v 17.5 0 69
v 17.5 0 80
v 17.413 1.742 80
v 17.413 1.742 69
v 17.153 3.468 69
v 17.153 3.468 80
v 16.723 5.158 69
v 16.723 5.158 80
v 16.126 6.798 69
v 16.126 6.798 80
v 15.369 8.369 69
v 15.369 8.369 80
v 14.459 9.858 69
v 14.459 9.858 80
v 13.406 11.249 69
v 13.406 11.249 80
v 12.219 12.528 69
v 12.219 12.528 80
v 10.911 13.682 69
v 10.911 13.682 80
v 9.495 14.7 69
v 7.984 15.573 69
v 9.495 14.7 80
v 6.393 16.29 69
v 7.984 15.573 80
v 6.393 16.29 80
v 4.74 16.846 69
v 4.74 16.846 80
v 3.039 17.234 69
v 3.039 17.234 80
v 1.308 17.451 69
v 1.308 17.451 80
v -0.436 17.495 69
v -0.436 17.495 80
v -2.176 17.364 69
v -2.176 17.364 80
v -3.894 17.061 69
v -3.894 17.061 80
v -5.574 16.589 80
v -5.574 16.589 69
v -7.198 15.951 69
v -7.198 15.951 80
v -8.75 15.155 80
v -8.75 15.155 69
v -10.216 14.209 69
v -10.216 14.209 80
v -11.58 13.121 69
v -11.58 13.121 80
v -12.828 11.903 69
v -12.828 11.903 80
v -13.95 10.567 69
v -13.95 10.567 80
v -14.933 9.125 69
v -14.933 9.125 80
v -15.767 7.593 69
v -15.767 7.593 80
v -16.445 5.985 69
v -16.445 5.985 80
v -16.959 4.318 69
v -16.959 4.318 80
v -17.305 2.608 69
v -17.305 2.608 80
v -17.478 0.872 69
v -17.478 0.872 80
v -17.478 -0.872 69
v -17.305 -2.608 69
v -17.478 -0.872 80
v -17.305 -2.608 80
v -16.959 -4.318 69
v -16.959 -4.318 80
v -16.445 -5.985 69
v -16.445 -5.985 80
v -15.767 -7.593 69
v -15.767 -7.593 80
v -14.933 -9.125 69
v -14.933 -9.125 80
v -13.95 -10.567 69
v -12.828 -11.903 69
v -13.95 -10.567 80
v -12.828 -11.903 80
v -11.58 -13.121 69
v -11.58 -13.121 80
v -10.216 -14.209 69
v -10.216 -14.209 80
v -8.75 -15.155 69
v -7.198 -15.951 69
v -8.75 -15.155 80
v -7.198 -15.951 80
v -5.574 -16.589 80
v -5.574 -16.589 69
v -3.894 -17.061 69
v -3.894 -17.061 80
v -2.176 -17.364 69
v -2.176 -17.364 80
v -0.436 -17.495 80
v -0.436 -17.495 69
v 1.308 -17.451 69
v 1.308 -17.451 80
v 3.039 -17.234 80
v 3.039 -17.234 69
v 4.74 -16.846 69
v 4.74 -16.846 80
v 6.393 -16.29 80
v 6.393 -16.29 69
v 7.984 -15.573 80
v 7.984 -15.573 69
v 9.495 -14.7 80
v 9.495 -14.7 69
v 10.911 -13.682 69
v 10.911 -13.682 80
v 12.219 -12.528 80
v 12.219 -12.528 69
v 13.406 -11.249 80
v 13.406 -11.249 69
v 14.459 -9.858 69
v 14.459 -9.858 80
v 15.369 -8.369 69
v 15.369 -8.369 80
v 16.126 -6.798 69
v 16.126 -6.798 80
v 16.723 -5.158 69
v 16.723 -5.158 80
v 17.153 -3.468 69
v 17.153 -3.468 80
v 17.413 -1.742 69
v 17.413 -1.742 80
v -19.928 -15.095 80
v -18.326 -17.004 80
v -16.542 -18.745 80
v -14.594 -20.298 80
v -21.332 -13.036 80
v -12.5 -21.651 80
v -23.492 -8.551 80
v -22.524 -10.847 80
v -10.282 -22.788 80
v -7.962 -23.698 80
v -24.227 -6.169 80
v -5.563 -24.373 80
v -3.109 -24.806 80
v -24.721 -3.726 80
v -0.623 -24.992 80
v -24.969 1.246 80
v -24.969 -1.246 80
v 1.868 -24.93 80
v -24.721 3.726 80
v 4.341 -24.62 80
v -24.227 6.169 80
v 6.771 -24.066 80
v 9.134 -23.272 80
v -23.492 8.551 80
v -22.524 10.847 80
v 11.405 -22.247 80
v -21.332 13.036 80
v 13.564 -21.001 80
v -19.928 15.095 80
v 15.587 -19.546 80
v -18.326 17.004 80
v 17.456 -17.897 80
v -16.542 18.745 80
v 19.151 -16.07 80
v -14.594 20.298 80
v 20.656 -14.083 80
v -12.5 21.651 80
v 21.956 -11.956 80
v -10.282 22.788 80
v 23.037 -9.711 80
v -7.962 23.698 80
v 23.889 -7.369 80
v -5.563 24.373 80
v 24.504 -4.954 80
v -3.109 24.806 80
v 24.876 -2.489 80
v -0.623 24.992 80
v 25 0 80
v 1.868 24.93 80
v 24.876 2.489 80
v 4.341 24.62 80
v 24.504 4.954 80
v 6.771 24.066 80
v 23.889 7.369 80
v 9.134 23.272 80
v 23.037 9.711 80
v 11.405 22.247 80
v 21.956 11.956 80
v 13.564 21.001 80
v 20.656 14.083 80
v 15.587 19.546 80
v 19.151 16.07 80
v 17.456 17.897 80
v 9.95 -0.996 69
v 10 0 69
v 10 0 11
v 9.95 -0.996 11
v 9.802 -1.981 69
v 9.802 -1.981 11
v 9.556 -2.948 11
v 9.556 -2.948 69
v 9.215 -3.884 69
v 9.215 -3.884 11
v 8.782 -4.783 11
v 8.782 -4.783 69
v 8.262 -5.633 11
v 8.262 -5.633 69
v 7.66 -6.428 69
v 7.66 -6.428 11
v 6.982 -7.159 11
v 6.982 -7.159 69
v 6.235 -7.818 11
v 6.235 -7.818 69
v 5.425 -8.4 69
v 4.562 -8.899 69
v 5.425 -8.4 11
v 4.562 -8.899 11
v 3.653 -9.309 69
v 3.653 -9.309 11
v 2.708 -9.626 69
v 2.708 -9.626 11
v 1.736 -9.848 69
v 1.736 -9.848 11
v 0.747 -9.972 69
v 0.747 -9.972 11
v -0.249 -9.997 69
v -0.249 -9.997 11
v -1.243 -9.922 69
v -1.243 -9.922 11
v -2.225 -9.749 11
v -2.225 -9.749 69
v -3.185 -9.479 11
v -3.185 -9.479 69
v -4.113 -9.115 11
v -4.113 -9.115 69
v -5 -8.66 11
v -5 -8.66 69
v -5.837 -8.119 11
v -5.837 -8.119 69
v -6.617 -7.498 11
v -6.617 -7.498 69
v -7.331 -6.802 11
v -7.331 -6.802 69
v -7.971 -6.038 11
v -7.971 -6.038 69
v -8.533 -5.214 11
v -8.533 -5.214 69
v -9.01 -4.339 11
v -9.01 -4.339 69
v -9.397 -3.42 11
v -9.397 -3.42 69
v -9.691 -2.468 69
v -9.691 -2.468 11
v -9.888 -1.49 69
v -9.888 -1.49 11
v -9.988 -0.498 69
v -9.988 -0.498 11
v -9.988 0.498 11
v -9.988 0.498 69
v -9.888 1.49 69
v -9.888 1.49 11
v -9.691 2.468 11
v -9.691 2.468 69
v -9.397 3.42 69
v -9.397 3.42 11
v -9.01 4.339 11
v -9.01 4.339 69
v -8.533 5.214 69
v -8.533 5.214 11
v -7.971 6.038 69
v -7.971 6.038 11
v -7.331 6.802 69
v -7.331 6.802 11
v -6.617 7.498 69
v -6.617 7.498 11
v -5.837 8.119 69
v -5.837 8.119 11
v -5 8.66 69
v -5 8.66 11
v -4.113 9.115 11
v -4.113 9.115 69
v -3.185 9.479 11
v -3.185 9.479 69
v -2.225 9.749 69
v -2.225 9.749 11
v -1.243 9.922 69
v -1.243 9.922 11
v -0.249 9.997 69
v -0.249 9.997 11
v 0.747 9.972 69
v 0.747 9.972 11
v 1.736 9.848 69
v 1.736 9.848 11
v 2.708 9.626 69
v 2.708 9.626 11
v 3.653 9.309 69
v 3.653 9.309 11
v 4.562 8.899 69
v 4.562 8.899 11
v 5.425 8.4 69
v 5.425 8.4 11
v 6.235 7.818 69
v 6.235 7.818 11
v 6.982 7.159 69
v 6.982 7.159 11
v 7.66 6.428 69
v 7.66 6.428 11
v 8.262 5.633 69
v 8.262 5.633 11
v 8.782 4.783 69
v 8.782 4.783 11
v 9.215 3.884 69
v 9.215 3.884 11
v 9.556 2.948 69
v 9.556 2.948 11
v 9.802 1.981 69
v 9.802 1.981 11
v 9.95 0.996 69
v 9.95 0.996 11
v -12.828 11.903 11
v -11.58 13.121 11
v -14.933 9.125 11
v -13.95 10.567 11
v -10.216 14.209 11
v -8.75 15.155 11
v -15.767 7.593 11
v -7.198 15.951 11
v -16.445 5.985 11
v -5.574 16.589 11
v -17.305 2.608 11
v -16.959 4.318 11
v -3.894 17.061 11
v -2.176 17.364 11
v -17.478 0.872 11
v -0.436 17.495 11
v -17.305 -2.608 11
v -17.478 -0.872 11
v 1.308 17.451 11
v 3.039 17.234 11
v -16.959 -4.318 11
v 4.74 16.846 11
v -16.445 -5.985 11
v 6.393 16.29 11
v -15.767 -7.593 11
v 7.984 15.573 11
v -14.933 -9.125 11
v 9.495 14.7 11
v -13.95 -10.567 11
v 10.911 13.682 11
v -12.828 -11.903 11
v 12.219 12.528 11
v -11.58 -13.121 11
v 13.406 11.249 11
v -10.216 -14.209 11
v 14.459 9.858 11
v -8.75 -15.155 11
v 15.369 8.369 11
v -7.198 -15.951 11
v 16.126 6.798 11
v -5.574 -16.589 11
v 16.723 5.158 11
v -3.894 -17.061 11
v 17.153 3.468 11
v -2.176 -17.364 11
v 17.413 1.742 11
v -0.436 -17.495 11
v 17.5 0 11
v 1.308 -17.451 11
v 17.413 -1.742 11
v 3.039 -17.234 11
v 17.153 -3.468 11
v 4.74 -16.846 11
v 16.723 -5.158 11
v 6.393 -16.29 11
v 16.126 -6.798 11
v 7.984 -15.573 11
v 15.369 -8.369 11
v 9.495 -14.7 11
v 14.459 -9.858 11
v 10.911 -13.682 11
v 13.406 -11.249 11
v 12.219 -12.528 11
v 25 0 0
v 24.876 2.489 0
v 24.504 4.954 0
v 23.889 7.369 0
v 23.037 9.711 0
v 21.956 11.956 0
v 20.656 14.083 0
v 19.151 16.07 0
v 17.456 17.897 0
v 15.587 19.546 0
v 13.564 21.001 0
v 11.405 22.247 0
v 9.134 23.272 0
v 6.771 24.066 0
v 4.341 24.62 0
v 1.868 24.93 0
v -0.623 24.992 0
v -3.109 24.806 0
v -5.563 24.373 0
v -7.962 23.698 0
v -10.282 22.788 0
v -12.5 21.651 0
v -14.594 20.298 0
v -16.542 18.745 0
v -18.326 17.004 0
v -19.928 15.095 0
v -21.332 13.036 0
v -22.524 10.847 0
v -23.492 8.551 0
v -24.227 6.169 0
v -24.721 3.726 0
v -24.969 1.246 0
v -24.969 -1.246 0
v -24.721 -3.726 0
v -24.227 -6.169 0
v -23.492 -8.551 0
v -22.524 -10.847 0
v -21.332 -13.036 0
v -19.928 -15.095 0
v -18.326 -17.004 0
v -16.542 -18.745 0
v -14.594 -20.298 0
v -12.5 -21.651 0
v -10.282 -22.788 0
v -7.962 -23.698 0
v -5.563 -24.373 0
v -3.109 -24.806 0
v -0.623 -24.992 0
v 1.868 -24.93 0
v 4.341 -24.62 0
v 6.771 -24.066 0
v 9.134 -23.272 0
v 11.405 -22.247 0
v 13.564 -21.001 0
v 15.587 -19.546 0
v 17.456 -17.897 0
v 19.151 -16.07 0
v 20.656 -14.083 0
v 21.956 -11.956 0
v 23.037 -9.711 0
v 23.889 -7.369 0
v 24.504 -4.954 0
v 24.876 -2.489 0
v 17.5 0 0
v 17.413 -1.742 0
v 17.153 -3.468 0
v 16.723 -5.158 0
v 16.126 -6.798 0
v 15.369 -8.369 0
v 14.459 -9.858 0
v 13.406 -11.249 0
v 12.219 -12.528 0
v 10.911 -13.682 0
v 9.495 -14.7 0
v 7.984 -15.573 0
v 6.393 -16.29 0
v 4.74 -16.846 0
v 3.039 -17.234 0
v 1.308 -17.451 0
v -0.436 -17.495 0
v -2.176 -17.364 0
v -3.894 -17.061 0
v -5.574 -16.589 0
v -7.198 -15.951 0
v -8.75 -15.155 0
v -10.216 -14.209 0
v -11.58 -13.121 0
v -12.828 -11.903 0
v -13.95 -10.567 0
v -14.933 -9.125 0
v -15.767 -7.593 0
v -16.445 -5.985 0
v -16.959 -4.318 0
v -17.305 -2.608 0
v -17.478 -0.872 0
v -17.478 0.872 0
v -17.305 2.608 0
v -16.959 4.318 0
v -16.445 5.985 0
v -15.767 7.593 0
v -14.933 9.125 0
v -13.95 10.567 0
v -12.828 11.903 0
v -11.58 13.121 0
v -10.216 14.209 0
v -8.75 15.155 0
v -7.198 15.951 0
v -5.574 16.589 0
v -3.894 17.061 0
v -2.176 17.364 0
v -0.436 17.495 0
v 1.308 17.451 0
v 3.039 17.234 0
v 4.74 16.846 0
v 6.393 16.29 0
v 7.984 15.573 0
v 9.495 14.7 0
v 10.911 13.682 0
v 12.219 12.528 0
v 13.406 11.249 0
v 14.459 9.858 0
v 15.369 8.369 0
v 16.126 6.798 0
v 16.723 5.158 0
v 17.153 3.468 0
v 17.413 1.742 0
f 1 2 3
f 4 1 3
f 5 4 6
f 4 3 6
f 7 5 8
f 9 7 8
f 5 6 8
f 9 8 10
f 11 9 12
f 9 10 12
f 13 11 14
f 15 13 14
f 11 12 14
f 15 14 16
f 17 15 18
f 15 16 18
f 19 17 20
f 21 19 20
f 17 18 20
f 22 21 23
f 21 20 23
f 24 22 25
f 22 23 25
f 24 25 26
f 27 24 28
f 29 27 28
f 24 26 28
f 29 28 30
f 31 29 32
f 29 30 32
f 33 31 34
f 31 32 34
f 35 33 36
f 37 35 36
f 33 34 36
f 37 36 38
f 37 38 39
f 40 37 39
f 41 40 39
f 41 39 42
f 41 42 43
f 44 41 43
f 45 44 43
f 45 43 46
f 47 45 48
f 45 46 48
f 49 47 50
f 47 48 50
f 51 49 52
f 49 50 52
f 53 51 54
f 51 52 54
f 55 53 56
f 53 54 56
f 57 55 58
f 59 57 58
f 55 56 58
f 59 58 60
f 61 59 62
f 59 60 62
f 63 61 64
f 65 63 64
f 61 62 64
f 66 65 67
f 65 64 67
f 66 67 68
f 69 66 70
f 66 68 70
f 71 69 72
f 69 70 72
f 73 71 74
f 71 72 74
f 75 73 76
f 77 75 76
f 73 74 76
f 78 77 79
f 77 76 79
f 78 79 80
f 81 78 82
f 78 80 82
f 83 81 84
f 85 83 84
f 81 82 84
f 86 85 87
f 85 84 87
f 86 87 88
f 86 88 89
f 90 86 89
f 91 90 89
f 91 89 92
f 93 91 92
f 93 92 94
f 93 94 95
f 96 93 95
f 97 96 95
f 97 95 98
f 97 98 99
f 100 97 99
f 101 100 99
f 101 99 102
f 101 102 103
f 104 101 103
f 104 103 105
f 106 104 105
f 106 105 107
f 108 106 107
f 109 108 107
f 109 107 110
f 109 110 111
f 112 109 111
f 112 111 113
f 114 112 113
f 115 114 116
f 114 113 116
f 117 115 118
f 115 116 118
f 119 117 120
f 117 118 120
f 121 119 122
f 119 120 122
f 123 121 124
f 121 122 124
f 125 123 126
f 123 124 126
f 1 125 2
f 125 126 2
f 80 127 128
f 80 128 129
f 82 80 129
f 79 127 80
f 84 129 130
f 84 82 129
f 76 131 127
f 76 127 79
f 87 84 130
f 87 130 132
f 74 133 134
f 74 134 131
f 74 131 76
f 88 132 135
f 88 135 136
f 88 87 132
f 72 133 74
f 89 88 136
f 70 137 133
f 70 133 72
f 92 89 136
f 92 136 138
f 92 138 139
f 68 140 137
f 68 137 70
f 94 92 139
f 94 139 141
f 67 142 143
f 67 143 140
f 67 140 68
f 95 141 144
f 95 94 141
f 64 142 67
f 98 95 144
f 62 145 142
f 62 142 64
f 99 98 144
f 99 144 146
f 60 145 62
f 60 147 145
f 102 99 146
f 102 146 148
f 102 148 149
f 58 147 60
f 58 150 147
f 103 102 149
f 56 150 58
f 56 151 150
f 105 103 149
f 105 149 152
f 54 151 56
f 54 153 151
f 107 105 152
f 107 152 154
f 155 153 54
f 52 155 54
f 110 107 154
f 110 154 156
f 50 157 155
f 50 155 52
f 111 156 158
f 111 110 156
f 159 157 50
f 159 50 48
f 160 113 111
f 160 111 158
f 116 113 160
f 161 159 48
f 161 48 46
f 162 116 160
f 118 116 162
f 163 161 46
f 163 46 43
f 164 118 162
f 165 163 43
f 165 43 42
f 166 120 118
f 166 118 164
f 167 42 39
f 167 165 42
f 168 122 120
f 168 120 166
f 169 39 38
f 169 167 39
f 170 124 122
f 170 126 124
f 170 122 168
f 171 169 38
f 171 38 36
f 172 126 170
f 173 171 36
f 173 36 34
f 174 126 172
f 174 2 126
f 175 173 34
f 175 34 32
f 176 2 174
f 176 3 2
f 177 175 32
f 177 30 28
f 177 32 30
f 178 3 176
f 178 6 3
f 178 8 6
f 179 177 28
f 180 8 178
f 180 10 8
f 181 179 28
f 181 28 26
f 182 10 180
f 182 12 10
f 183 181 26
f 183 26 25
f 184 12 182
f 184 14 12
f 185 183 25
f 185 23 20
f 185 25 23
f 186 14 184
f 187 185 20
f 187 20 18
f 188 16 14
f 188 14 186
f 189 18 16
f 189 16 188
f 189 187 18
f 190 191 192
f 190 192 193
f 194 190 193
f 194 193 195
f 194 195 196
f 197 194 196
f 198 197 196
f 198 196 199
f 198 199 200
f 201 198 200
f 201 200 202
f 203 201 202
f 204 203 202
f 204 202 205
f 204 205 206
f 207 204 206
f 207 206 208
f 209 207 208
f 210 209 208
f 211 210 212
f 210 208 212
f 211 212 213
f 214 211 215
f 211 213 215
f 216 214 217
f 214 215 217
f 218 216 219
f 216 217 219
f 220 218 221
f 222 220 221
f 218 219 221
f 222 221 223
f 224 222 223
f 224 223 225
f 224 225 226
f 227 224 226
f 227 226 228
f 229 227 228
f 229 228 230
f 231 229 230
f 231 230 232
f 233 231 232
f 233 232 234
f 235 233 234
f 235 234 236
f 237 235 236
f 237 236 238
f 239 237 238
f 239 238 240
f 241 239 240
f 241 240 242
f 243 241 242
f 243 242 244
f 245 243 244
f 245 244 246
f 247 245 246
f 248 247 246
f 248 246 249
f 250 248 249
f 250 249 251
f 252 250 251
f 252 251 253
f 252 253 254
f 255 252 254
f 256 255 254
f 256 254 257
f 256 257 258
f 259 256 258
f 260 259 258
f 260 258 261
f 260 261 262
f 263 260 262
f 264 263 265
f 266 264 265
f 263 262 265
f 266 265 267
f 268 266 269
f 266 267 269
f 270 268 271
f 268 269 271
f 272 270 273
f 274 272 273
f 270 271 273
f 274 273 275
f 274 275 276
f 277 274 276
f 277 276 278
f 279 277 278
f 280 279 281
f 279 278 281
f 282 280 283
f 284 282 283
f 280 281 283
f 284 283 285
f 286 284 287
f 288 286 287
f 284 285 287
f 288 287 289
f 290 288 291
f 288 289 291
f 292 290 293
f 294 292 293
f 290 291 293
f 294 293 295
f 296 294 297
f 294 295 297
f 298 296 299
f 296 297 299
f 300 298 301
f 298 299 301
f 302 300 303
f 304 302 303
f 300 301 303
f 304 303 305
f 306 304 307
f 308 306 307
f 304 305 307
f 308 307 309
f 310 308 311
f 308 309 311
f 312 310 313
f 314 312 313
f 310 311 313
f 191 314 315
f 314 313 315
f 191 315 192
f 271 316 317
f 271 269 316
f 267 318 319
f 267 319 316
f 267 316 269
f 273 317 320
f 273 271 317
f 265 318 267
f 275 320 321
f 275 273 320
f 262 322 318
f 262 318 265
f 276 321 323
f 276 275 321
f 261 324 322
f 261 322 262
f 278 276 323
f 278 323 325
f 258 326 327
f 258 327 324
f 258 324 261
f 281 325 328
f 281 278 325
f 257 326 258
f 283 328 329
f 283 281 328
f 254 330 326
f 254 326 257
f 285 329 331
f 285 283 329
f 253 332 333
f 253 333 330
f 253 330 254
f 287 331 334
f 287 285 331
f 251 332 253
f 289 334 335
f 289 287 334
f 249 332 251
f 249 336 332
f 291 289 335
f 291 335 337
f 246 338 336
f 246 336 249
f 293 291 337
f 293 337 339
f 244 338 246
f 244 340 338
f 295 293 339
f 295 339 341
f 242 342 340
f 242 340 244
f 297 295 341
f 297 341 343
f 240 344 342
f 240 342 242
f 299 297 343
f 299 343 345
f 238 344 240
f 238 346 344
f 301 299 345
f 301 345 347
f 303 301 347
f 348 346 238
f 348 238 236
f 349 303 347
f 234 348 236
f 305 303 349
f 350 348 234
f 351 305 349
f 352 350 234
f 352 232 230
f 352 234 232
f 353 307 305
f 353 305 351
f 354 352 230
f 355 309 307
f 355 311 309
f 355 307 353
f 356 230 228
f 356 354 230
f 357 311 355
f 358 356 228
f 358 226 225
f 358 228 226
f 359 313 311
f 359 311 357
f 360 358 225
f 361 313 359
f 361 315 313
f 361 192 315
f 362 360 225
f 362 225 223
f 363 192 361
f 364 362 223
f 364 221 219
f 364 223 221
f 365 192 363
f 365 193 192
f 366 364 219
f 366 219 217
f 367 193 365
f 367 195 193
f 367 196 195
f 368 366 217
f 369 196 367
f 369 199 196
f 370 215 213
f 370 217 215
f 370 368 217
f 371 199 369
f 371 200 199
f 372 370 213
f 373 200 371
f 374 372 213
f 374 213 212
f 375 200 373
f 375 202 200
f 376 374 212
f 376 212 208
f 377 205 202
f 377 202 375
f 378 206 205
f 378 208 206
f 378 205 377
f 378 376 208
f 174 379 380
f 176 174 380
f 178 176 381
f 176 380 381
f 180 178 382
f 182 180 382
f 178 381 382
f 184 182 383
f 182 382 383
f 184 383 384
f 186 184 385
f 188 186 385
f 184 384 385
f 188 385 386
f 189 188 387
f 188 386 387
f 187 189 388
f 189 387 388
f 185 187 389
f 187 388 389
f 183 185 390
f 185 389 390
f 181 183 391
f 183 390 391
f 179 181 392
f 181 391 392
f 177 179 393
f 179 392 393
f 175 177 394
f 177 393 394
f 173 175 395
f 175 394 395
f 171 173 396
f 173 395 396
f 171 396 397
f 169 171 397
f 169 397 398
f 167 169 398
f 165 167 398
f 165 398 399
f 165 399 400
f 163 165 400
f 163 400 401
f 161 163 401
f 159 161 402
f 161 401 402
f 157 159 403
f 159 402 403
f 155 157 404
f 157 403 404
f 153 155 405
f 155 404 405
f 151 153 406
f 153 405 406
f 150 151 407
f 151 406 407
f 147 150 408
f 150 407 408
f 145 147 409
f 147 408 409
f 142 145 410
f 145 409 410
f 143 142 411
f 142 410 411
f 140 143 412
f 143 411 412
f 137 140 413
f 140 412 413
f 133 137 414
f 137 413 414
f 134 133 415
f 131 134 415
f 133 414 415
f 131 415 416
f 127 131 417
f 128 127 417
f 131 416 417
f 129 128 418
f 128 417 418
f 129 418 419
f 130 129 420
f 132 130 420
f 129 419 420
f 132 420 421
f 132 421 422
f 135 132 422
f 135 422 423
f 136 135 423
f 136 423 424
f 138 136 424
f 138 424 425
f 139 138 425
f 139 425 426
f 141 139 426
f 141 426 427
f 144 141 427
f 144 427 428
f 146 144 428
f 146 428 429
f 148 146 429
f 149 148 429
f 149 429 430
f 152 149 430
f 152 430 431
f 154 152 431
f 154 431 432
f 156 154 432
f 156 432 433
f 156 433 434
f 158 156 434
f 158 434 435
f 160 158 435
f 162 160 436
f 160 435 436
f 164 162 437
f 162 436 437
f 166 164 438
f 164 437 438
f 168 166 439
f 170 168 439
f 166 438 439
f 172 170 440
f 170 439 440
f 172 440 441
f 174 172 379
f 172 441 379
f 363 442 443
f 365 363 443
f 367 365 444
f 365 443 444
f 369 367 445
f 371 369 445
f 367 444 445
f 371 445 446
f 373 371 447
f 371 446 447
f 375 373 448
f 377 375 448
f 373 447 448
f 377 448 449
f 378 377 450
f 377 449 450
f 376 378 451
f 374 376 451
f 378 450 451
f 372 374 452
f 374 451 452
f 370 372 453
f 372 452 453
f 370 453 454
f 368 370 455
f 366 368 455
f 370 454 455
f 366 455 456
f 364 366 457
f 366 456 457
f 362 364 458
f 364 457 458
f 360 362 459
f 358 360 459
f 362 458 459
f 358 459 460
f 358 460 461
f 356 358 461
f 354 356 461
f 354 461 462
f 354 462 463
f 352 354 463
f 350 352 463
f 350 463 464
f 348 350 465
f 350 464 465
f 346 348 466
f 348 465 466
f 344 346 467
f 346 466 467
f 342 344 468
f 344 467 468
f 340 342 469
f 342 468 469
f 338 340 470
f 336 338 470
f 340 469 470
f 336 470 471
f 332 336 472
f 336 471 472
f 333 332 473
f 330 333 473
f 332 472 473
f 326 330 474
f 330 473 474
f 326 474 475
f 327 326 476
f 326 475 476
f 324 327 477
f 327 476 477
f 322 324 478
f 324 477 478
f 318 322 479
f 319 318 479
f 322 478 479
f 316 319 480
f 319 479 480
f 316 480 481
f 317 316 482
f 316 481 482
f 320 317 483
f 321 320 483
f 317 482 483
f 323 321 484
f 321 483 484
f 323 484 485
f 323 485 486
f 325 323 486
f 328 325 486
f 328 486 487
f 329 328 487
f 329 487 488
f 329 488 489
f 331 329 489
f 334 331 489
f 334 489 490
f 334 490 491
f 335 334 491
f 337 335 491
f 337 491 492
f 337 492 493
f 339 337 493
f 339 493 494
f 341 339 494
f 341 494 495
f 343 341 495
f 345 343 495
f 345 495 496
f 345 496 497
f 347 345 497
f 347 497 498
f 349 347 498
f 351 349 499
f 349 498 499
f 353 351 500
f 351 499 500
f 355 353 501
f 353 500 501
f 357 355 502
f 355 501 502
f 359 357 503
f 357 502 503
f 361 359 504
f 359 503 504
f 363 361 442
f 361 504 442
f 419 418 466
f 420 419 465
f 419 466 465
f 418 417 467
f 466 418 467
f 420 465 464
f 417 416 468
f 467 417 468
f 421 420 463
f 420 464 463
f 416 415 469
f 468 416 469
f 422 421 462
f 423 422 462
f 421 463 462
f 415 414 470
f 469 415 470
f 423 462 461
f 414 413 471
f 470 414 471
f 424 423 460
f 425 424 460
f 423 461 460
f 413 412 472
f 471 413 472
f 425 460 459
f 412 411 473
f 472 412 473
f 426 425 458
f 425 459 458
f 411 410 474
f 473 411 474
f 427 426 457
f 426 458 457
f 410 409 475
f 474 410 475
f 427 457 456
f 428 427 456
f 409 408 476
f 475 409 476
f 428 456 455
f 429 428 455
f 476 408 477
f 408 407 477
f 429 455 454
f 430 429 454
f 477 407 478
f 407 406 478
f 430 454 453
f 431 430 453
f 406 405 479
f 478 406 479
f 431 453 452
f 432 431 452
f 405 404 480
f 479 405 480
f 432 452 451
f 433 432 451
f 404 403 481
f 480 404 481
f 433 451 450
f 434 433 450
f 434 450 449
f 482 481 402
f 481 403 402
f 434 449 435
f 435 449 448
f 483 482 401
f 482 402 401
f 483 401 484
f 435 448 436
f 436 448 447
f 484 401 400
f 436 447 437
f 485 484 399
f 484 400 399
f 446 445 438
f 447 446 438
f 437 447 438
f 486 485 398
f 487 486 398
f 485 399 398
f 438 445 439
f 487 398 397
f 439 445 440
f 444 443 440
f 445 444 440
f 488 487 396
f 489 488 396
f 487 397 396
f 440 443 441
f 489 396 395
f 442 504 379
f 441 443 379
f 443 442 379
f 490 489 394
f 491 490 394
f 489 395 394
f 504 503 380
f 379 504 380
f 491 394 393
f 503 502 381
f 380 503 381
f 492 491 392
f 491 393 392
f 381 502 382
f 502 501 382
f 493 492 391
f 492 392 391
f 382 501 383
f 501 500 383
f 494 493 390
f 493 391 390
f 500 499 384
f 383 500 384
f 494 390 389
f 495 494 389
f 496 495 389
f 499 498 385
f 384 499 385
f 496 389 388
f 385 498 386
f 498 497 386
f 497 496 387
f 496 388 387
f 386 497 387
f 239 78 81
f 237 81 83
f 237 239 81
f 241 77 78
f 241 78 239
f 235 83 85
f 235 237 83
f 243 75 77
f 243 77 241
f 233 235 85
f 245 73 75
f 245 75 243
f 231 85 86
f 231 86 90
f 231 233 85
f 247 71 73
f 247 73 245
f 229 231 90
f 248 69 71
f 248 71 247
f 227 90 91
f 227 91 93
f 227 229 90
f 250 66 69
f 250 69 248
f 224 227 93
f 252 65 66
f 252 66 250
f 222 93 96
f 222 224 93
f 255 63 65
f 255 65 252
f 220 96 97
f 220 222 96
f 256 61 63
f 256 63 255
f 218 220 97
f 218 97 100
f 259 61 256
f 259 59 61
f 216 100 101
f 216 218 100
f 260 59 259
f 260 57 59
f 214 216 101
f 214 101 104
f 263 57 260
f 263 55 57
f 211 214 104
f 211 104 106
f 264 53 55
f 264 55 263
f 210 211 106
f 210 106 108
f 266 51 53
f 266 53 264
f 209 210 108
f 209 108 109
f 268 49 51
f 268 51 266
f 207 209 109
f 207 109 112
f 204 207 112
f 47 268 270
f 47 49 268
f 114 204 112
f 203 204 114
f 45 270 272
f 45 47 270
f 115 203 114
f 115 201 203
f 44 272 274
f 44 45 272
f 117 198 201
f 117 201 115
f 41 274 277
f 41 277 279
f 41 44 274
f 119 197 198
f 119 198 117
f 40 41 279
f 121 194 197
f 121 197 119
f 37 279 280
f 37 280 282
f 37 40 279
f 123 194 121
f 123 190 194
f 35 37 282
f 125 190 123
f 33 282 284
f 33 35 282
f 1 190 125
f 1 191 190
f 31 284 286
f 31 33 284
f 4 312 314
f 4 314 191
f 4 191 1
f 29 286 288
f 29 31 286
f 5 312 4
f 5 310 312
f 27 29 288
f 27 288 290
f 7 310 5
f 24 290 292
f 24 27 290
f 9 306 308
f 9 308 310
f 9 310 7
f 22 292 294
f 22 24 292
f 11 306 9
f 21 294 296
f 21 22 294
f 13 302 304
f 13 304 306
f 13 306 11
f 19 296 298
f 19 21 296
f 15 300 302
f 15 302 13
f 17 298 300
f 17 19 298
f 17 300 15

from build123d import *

# Parameters (mm, degrees)
F0_R     = 25
F1_DEPTH = 80
F2_R     = 17.5
F3_DEPTH = 11
F4_R     = 17.5
F5_DEPTH = 11
F6_R     = 10
F7_DEPTH = 100


with BuildPart() as f1:
    # F0 (on Top) → F1 (new body)
    with BuildSketch(Plane.XY):
        Circle(F0_R)
    extrude(amount=F1_DEPTH)

    # F2 (on face) → F3 (cut)
    with BuildSketch(Plane.XY.offset(80)):
        Circle(F2_R)
    extrude(amount=-F3_DEPTH, mode=Mode.SUBTRACT)

    # F4 (on face) → F5 (cut)
    with BuildSketch(Plane(origin=(0, 0, 0), x_dir=(1, 0, 0), z_dir=(0, 0, -1))):
        Circle(F4_R)
    extrude(amount=-F5_DEPTH, mode=Mode.SUBTRACT)

    # F6 (on face) → F7 (cut)
    with BuildSketch(Plane(origin=(0, 0, 11), x_dir=(1, 0, 0), z_dir=(0, 0, -1))):
        Circle(F6_R)
    extrude(amount=-F7_DEPTH, mode=Mode.SUBTRACT)


solid = f1.part
